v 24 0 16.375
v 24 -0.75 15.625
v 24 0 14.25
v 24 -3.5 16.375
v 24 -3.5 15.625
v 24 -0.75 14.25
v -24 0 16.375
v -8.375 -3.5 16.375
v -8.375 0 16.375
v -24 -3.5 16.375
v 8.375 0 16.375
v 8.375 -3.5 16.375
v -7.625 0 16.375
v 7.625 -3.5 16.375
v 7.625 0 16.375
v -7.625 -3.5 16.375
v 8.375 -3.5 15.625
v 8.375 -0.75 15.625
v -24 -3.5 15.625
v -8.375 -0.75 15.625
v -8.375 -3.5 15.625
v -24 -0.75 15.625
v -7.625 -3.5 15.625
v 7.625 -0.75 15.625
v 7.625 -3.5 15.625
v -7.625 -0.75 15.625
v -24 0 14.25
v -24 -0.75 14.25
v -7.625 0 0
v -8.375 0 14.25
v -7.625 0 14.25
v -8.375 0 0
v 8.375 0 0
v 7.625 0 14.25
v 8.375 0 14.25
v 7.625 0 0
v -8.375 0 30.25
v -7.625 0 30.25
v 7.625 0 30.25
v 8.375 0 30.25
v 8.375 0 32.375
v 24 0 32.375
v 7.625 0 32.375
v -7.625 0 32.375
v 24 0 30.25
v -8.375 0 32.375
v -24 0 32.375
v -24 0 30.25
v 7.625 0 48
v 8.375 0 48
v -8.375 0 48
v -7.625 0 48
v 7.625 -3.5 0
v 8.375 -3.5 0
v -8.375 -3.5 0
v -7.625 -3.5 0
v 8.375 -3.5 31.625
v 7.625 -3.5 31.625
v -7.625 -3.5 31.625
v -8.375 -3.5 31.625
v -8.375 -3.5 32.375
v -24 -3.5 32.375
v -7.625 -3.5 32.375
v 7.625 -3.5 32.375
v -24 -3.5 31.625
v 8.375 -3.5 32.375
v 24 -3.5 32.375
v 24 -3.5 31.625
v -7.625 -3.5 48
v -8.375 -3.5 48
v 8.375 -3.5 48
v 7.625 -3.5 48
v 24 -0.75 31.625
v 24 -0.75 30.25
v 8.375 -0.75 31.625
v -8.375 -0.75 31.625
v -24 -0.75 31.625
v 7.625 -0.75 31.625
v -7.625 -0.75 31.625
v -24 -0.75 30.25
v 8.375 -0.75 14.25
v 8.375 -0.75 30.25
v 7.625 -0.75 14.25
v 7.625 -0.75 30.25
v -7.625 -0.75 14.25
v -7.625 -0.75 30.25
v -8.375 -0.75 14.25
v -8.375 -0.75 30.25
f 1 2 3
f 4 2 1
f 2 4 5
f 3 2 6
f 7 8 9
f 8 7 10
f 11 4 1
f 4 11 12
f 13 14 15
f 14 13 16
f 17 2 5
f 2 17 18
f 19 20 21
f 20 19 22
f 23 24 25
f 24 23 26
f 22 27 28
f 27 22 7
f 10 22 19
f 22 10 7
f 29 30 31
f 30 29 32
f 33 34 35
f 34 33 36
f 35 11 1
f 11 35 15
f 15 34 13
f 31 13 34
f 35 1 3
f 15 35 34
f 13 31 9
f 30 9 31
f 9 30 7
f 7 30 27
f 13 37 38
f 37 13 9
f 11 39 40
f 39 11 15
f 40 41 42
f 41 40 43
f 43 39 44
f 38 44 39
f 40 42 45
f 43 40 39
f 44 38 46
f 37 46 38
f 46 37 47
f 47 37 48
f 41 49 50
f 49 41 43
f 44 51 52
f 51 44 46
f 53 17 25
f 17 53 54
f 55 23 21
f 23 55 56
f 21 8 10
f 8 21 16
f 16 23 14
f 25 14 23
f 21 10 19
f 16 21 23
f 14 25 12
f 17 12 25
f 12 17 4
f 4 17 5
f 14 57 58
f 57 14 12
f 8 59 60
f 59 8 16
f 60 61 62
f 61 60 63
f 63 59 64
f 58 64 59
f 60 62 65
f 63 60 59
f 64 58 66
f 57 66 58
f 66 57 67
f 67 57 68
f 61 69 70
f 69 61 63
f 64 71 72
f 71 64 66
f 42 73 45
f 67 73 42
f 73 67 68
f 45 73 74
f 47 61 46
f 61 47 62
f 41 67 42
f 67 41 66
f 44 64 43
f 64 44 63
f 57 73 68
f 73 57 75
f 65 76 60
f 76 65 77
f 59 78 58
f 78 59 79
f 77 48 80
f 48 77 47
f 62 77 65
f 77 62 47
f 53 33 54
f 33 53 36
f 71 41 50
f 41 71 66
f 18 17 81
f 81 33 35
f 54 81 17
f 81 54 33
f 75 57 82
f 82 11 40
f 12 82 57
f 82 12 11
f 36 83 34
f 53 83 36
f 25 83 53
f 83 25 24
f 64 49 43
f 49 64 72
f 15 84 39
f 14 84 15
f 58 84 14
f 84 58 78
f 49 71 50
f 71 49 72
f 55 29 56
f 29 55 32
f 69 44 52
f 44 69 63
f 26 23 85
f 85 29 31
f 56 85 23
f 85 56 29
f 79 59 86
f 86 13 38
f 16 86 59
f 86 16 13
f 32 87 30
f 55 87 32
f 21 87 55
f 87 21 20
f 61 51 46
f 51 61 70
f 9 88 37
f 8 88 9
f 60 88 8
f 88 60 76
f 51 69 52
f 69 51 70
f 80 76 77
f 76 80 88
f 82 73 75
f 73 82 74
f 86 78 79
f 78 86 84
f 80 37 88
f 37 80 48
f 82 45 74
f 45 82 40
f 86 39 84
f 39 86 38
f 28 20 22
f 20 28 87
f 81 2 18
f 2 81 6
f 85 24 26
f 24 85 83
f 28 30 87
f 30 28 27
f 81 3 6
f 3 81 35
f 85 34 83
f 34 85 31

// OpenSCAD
// Cass Tic Tac Toe

module board(x, width){
    
    translate([0, -1.75, 0])
    cube([x, width, 0.75], true);
}



module main(){
    
    //Main part
    //Horiz
    translate([0, 0, 16])
    board(48, 3.5);
    translate([0, 0, 32])
    board(48, 3.5);
    //Vert
    translate([8, 0, 24])
    rotate([0, 90, 0])
    board(48, 3.5);
    translate([-8, 0, 24])
    rotate([0, 90, 0])
    board(48, 3.5);
    
//    //Square border
//    //Vert
//    translate([24, 0, 24])
//    rotate([0, 90, 0])
//    board(48, 3.5);
//    translate([-24, 0, 24])
//    rotate([0, 90, 0])
//    board(48, 3.5);
//    //Horiz
//    translate([0, 0, -0.375])
//    board(48.75, 3.5);
//    translate([0, 0, 48.375])
//    board(48.75, 3.5);

    //Mount
    translate([0, -0.375, 32.75])
    rotate([90, 0, 0])
    board(48, 1.5);
    translate([0, -0.375, 16.75])
    rotate([90, 0, 0])
    board(48, 1.5);
    
    
}main();
